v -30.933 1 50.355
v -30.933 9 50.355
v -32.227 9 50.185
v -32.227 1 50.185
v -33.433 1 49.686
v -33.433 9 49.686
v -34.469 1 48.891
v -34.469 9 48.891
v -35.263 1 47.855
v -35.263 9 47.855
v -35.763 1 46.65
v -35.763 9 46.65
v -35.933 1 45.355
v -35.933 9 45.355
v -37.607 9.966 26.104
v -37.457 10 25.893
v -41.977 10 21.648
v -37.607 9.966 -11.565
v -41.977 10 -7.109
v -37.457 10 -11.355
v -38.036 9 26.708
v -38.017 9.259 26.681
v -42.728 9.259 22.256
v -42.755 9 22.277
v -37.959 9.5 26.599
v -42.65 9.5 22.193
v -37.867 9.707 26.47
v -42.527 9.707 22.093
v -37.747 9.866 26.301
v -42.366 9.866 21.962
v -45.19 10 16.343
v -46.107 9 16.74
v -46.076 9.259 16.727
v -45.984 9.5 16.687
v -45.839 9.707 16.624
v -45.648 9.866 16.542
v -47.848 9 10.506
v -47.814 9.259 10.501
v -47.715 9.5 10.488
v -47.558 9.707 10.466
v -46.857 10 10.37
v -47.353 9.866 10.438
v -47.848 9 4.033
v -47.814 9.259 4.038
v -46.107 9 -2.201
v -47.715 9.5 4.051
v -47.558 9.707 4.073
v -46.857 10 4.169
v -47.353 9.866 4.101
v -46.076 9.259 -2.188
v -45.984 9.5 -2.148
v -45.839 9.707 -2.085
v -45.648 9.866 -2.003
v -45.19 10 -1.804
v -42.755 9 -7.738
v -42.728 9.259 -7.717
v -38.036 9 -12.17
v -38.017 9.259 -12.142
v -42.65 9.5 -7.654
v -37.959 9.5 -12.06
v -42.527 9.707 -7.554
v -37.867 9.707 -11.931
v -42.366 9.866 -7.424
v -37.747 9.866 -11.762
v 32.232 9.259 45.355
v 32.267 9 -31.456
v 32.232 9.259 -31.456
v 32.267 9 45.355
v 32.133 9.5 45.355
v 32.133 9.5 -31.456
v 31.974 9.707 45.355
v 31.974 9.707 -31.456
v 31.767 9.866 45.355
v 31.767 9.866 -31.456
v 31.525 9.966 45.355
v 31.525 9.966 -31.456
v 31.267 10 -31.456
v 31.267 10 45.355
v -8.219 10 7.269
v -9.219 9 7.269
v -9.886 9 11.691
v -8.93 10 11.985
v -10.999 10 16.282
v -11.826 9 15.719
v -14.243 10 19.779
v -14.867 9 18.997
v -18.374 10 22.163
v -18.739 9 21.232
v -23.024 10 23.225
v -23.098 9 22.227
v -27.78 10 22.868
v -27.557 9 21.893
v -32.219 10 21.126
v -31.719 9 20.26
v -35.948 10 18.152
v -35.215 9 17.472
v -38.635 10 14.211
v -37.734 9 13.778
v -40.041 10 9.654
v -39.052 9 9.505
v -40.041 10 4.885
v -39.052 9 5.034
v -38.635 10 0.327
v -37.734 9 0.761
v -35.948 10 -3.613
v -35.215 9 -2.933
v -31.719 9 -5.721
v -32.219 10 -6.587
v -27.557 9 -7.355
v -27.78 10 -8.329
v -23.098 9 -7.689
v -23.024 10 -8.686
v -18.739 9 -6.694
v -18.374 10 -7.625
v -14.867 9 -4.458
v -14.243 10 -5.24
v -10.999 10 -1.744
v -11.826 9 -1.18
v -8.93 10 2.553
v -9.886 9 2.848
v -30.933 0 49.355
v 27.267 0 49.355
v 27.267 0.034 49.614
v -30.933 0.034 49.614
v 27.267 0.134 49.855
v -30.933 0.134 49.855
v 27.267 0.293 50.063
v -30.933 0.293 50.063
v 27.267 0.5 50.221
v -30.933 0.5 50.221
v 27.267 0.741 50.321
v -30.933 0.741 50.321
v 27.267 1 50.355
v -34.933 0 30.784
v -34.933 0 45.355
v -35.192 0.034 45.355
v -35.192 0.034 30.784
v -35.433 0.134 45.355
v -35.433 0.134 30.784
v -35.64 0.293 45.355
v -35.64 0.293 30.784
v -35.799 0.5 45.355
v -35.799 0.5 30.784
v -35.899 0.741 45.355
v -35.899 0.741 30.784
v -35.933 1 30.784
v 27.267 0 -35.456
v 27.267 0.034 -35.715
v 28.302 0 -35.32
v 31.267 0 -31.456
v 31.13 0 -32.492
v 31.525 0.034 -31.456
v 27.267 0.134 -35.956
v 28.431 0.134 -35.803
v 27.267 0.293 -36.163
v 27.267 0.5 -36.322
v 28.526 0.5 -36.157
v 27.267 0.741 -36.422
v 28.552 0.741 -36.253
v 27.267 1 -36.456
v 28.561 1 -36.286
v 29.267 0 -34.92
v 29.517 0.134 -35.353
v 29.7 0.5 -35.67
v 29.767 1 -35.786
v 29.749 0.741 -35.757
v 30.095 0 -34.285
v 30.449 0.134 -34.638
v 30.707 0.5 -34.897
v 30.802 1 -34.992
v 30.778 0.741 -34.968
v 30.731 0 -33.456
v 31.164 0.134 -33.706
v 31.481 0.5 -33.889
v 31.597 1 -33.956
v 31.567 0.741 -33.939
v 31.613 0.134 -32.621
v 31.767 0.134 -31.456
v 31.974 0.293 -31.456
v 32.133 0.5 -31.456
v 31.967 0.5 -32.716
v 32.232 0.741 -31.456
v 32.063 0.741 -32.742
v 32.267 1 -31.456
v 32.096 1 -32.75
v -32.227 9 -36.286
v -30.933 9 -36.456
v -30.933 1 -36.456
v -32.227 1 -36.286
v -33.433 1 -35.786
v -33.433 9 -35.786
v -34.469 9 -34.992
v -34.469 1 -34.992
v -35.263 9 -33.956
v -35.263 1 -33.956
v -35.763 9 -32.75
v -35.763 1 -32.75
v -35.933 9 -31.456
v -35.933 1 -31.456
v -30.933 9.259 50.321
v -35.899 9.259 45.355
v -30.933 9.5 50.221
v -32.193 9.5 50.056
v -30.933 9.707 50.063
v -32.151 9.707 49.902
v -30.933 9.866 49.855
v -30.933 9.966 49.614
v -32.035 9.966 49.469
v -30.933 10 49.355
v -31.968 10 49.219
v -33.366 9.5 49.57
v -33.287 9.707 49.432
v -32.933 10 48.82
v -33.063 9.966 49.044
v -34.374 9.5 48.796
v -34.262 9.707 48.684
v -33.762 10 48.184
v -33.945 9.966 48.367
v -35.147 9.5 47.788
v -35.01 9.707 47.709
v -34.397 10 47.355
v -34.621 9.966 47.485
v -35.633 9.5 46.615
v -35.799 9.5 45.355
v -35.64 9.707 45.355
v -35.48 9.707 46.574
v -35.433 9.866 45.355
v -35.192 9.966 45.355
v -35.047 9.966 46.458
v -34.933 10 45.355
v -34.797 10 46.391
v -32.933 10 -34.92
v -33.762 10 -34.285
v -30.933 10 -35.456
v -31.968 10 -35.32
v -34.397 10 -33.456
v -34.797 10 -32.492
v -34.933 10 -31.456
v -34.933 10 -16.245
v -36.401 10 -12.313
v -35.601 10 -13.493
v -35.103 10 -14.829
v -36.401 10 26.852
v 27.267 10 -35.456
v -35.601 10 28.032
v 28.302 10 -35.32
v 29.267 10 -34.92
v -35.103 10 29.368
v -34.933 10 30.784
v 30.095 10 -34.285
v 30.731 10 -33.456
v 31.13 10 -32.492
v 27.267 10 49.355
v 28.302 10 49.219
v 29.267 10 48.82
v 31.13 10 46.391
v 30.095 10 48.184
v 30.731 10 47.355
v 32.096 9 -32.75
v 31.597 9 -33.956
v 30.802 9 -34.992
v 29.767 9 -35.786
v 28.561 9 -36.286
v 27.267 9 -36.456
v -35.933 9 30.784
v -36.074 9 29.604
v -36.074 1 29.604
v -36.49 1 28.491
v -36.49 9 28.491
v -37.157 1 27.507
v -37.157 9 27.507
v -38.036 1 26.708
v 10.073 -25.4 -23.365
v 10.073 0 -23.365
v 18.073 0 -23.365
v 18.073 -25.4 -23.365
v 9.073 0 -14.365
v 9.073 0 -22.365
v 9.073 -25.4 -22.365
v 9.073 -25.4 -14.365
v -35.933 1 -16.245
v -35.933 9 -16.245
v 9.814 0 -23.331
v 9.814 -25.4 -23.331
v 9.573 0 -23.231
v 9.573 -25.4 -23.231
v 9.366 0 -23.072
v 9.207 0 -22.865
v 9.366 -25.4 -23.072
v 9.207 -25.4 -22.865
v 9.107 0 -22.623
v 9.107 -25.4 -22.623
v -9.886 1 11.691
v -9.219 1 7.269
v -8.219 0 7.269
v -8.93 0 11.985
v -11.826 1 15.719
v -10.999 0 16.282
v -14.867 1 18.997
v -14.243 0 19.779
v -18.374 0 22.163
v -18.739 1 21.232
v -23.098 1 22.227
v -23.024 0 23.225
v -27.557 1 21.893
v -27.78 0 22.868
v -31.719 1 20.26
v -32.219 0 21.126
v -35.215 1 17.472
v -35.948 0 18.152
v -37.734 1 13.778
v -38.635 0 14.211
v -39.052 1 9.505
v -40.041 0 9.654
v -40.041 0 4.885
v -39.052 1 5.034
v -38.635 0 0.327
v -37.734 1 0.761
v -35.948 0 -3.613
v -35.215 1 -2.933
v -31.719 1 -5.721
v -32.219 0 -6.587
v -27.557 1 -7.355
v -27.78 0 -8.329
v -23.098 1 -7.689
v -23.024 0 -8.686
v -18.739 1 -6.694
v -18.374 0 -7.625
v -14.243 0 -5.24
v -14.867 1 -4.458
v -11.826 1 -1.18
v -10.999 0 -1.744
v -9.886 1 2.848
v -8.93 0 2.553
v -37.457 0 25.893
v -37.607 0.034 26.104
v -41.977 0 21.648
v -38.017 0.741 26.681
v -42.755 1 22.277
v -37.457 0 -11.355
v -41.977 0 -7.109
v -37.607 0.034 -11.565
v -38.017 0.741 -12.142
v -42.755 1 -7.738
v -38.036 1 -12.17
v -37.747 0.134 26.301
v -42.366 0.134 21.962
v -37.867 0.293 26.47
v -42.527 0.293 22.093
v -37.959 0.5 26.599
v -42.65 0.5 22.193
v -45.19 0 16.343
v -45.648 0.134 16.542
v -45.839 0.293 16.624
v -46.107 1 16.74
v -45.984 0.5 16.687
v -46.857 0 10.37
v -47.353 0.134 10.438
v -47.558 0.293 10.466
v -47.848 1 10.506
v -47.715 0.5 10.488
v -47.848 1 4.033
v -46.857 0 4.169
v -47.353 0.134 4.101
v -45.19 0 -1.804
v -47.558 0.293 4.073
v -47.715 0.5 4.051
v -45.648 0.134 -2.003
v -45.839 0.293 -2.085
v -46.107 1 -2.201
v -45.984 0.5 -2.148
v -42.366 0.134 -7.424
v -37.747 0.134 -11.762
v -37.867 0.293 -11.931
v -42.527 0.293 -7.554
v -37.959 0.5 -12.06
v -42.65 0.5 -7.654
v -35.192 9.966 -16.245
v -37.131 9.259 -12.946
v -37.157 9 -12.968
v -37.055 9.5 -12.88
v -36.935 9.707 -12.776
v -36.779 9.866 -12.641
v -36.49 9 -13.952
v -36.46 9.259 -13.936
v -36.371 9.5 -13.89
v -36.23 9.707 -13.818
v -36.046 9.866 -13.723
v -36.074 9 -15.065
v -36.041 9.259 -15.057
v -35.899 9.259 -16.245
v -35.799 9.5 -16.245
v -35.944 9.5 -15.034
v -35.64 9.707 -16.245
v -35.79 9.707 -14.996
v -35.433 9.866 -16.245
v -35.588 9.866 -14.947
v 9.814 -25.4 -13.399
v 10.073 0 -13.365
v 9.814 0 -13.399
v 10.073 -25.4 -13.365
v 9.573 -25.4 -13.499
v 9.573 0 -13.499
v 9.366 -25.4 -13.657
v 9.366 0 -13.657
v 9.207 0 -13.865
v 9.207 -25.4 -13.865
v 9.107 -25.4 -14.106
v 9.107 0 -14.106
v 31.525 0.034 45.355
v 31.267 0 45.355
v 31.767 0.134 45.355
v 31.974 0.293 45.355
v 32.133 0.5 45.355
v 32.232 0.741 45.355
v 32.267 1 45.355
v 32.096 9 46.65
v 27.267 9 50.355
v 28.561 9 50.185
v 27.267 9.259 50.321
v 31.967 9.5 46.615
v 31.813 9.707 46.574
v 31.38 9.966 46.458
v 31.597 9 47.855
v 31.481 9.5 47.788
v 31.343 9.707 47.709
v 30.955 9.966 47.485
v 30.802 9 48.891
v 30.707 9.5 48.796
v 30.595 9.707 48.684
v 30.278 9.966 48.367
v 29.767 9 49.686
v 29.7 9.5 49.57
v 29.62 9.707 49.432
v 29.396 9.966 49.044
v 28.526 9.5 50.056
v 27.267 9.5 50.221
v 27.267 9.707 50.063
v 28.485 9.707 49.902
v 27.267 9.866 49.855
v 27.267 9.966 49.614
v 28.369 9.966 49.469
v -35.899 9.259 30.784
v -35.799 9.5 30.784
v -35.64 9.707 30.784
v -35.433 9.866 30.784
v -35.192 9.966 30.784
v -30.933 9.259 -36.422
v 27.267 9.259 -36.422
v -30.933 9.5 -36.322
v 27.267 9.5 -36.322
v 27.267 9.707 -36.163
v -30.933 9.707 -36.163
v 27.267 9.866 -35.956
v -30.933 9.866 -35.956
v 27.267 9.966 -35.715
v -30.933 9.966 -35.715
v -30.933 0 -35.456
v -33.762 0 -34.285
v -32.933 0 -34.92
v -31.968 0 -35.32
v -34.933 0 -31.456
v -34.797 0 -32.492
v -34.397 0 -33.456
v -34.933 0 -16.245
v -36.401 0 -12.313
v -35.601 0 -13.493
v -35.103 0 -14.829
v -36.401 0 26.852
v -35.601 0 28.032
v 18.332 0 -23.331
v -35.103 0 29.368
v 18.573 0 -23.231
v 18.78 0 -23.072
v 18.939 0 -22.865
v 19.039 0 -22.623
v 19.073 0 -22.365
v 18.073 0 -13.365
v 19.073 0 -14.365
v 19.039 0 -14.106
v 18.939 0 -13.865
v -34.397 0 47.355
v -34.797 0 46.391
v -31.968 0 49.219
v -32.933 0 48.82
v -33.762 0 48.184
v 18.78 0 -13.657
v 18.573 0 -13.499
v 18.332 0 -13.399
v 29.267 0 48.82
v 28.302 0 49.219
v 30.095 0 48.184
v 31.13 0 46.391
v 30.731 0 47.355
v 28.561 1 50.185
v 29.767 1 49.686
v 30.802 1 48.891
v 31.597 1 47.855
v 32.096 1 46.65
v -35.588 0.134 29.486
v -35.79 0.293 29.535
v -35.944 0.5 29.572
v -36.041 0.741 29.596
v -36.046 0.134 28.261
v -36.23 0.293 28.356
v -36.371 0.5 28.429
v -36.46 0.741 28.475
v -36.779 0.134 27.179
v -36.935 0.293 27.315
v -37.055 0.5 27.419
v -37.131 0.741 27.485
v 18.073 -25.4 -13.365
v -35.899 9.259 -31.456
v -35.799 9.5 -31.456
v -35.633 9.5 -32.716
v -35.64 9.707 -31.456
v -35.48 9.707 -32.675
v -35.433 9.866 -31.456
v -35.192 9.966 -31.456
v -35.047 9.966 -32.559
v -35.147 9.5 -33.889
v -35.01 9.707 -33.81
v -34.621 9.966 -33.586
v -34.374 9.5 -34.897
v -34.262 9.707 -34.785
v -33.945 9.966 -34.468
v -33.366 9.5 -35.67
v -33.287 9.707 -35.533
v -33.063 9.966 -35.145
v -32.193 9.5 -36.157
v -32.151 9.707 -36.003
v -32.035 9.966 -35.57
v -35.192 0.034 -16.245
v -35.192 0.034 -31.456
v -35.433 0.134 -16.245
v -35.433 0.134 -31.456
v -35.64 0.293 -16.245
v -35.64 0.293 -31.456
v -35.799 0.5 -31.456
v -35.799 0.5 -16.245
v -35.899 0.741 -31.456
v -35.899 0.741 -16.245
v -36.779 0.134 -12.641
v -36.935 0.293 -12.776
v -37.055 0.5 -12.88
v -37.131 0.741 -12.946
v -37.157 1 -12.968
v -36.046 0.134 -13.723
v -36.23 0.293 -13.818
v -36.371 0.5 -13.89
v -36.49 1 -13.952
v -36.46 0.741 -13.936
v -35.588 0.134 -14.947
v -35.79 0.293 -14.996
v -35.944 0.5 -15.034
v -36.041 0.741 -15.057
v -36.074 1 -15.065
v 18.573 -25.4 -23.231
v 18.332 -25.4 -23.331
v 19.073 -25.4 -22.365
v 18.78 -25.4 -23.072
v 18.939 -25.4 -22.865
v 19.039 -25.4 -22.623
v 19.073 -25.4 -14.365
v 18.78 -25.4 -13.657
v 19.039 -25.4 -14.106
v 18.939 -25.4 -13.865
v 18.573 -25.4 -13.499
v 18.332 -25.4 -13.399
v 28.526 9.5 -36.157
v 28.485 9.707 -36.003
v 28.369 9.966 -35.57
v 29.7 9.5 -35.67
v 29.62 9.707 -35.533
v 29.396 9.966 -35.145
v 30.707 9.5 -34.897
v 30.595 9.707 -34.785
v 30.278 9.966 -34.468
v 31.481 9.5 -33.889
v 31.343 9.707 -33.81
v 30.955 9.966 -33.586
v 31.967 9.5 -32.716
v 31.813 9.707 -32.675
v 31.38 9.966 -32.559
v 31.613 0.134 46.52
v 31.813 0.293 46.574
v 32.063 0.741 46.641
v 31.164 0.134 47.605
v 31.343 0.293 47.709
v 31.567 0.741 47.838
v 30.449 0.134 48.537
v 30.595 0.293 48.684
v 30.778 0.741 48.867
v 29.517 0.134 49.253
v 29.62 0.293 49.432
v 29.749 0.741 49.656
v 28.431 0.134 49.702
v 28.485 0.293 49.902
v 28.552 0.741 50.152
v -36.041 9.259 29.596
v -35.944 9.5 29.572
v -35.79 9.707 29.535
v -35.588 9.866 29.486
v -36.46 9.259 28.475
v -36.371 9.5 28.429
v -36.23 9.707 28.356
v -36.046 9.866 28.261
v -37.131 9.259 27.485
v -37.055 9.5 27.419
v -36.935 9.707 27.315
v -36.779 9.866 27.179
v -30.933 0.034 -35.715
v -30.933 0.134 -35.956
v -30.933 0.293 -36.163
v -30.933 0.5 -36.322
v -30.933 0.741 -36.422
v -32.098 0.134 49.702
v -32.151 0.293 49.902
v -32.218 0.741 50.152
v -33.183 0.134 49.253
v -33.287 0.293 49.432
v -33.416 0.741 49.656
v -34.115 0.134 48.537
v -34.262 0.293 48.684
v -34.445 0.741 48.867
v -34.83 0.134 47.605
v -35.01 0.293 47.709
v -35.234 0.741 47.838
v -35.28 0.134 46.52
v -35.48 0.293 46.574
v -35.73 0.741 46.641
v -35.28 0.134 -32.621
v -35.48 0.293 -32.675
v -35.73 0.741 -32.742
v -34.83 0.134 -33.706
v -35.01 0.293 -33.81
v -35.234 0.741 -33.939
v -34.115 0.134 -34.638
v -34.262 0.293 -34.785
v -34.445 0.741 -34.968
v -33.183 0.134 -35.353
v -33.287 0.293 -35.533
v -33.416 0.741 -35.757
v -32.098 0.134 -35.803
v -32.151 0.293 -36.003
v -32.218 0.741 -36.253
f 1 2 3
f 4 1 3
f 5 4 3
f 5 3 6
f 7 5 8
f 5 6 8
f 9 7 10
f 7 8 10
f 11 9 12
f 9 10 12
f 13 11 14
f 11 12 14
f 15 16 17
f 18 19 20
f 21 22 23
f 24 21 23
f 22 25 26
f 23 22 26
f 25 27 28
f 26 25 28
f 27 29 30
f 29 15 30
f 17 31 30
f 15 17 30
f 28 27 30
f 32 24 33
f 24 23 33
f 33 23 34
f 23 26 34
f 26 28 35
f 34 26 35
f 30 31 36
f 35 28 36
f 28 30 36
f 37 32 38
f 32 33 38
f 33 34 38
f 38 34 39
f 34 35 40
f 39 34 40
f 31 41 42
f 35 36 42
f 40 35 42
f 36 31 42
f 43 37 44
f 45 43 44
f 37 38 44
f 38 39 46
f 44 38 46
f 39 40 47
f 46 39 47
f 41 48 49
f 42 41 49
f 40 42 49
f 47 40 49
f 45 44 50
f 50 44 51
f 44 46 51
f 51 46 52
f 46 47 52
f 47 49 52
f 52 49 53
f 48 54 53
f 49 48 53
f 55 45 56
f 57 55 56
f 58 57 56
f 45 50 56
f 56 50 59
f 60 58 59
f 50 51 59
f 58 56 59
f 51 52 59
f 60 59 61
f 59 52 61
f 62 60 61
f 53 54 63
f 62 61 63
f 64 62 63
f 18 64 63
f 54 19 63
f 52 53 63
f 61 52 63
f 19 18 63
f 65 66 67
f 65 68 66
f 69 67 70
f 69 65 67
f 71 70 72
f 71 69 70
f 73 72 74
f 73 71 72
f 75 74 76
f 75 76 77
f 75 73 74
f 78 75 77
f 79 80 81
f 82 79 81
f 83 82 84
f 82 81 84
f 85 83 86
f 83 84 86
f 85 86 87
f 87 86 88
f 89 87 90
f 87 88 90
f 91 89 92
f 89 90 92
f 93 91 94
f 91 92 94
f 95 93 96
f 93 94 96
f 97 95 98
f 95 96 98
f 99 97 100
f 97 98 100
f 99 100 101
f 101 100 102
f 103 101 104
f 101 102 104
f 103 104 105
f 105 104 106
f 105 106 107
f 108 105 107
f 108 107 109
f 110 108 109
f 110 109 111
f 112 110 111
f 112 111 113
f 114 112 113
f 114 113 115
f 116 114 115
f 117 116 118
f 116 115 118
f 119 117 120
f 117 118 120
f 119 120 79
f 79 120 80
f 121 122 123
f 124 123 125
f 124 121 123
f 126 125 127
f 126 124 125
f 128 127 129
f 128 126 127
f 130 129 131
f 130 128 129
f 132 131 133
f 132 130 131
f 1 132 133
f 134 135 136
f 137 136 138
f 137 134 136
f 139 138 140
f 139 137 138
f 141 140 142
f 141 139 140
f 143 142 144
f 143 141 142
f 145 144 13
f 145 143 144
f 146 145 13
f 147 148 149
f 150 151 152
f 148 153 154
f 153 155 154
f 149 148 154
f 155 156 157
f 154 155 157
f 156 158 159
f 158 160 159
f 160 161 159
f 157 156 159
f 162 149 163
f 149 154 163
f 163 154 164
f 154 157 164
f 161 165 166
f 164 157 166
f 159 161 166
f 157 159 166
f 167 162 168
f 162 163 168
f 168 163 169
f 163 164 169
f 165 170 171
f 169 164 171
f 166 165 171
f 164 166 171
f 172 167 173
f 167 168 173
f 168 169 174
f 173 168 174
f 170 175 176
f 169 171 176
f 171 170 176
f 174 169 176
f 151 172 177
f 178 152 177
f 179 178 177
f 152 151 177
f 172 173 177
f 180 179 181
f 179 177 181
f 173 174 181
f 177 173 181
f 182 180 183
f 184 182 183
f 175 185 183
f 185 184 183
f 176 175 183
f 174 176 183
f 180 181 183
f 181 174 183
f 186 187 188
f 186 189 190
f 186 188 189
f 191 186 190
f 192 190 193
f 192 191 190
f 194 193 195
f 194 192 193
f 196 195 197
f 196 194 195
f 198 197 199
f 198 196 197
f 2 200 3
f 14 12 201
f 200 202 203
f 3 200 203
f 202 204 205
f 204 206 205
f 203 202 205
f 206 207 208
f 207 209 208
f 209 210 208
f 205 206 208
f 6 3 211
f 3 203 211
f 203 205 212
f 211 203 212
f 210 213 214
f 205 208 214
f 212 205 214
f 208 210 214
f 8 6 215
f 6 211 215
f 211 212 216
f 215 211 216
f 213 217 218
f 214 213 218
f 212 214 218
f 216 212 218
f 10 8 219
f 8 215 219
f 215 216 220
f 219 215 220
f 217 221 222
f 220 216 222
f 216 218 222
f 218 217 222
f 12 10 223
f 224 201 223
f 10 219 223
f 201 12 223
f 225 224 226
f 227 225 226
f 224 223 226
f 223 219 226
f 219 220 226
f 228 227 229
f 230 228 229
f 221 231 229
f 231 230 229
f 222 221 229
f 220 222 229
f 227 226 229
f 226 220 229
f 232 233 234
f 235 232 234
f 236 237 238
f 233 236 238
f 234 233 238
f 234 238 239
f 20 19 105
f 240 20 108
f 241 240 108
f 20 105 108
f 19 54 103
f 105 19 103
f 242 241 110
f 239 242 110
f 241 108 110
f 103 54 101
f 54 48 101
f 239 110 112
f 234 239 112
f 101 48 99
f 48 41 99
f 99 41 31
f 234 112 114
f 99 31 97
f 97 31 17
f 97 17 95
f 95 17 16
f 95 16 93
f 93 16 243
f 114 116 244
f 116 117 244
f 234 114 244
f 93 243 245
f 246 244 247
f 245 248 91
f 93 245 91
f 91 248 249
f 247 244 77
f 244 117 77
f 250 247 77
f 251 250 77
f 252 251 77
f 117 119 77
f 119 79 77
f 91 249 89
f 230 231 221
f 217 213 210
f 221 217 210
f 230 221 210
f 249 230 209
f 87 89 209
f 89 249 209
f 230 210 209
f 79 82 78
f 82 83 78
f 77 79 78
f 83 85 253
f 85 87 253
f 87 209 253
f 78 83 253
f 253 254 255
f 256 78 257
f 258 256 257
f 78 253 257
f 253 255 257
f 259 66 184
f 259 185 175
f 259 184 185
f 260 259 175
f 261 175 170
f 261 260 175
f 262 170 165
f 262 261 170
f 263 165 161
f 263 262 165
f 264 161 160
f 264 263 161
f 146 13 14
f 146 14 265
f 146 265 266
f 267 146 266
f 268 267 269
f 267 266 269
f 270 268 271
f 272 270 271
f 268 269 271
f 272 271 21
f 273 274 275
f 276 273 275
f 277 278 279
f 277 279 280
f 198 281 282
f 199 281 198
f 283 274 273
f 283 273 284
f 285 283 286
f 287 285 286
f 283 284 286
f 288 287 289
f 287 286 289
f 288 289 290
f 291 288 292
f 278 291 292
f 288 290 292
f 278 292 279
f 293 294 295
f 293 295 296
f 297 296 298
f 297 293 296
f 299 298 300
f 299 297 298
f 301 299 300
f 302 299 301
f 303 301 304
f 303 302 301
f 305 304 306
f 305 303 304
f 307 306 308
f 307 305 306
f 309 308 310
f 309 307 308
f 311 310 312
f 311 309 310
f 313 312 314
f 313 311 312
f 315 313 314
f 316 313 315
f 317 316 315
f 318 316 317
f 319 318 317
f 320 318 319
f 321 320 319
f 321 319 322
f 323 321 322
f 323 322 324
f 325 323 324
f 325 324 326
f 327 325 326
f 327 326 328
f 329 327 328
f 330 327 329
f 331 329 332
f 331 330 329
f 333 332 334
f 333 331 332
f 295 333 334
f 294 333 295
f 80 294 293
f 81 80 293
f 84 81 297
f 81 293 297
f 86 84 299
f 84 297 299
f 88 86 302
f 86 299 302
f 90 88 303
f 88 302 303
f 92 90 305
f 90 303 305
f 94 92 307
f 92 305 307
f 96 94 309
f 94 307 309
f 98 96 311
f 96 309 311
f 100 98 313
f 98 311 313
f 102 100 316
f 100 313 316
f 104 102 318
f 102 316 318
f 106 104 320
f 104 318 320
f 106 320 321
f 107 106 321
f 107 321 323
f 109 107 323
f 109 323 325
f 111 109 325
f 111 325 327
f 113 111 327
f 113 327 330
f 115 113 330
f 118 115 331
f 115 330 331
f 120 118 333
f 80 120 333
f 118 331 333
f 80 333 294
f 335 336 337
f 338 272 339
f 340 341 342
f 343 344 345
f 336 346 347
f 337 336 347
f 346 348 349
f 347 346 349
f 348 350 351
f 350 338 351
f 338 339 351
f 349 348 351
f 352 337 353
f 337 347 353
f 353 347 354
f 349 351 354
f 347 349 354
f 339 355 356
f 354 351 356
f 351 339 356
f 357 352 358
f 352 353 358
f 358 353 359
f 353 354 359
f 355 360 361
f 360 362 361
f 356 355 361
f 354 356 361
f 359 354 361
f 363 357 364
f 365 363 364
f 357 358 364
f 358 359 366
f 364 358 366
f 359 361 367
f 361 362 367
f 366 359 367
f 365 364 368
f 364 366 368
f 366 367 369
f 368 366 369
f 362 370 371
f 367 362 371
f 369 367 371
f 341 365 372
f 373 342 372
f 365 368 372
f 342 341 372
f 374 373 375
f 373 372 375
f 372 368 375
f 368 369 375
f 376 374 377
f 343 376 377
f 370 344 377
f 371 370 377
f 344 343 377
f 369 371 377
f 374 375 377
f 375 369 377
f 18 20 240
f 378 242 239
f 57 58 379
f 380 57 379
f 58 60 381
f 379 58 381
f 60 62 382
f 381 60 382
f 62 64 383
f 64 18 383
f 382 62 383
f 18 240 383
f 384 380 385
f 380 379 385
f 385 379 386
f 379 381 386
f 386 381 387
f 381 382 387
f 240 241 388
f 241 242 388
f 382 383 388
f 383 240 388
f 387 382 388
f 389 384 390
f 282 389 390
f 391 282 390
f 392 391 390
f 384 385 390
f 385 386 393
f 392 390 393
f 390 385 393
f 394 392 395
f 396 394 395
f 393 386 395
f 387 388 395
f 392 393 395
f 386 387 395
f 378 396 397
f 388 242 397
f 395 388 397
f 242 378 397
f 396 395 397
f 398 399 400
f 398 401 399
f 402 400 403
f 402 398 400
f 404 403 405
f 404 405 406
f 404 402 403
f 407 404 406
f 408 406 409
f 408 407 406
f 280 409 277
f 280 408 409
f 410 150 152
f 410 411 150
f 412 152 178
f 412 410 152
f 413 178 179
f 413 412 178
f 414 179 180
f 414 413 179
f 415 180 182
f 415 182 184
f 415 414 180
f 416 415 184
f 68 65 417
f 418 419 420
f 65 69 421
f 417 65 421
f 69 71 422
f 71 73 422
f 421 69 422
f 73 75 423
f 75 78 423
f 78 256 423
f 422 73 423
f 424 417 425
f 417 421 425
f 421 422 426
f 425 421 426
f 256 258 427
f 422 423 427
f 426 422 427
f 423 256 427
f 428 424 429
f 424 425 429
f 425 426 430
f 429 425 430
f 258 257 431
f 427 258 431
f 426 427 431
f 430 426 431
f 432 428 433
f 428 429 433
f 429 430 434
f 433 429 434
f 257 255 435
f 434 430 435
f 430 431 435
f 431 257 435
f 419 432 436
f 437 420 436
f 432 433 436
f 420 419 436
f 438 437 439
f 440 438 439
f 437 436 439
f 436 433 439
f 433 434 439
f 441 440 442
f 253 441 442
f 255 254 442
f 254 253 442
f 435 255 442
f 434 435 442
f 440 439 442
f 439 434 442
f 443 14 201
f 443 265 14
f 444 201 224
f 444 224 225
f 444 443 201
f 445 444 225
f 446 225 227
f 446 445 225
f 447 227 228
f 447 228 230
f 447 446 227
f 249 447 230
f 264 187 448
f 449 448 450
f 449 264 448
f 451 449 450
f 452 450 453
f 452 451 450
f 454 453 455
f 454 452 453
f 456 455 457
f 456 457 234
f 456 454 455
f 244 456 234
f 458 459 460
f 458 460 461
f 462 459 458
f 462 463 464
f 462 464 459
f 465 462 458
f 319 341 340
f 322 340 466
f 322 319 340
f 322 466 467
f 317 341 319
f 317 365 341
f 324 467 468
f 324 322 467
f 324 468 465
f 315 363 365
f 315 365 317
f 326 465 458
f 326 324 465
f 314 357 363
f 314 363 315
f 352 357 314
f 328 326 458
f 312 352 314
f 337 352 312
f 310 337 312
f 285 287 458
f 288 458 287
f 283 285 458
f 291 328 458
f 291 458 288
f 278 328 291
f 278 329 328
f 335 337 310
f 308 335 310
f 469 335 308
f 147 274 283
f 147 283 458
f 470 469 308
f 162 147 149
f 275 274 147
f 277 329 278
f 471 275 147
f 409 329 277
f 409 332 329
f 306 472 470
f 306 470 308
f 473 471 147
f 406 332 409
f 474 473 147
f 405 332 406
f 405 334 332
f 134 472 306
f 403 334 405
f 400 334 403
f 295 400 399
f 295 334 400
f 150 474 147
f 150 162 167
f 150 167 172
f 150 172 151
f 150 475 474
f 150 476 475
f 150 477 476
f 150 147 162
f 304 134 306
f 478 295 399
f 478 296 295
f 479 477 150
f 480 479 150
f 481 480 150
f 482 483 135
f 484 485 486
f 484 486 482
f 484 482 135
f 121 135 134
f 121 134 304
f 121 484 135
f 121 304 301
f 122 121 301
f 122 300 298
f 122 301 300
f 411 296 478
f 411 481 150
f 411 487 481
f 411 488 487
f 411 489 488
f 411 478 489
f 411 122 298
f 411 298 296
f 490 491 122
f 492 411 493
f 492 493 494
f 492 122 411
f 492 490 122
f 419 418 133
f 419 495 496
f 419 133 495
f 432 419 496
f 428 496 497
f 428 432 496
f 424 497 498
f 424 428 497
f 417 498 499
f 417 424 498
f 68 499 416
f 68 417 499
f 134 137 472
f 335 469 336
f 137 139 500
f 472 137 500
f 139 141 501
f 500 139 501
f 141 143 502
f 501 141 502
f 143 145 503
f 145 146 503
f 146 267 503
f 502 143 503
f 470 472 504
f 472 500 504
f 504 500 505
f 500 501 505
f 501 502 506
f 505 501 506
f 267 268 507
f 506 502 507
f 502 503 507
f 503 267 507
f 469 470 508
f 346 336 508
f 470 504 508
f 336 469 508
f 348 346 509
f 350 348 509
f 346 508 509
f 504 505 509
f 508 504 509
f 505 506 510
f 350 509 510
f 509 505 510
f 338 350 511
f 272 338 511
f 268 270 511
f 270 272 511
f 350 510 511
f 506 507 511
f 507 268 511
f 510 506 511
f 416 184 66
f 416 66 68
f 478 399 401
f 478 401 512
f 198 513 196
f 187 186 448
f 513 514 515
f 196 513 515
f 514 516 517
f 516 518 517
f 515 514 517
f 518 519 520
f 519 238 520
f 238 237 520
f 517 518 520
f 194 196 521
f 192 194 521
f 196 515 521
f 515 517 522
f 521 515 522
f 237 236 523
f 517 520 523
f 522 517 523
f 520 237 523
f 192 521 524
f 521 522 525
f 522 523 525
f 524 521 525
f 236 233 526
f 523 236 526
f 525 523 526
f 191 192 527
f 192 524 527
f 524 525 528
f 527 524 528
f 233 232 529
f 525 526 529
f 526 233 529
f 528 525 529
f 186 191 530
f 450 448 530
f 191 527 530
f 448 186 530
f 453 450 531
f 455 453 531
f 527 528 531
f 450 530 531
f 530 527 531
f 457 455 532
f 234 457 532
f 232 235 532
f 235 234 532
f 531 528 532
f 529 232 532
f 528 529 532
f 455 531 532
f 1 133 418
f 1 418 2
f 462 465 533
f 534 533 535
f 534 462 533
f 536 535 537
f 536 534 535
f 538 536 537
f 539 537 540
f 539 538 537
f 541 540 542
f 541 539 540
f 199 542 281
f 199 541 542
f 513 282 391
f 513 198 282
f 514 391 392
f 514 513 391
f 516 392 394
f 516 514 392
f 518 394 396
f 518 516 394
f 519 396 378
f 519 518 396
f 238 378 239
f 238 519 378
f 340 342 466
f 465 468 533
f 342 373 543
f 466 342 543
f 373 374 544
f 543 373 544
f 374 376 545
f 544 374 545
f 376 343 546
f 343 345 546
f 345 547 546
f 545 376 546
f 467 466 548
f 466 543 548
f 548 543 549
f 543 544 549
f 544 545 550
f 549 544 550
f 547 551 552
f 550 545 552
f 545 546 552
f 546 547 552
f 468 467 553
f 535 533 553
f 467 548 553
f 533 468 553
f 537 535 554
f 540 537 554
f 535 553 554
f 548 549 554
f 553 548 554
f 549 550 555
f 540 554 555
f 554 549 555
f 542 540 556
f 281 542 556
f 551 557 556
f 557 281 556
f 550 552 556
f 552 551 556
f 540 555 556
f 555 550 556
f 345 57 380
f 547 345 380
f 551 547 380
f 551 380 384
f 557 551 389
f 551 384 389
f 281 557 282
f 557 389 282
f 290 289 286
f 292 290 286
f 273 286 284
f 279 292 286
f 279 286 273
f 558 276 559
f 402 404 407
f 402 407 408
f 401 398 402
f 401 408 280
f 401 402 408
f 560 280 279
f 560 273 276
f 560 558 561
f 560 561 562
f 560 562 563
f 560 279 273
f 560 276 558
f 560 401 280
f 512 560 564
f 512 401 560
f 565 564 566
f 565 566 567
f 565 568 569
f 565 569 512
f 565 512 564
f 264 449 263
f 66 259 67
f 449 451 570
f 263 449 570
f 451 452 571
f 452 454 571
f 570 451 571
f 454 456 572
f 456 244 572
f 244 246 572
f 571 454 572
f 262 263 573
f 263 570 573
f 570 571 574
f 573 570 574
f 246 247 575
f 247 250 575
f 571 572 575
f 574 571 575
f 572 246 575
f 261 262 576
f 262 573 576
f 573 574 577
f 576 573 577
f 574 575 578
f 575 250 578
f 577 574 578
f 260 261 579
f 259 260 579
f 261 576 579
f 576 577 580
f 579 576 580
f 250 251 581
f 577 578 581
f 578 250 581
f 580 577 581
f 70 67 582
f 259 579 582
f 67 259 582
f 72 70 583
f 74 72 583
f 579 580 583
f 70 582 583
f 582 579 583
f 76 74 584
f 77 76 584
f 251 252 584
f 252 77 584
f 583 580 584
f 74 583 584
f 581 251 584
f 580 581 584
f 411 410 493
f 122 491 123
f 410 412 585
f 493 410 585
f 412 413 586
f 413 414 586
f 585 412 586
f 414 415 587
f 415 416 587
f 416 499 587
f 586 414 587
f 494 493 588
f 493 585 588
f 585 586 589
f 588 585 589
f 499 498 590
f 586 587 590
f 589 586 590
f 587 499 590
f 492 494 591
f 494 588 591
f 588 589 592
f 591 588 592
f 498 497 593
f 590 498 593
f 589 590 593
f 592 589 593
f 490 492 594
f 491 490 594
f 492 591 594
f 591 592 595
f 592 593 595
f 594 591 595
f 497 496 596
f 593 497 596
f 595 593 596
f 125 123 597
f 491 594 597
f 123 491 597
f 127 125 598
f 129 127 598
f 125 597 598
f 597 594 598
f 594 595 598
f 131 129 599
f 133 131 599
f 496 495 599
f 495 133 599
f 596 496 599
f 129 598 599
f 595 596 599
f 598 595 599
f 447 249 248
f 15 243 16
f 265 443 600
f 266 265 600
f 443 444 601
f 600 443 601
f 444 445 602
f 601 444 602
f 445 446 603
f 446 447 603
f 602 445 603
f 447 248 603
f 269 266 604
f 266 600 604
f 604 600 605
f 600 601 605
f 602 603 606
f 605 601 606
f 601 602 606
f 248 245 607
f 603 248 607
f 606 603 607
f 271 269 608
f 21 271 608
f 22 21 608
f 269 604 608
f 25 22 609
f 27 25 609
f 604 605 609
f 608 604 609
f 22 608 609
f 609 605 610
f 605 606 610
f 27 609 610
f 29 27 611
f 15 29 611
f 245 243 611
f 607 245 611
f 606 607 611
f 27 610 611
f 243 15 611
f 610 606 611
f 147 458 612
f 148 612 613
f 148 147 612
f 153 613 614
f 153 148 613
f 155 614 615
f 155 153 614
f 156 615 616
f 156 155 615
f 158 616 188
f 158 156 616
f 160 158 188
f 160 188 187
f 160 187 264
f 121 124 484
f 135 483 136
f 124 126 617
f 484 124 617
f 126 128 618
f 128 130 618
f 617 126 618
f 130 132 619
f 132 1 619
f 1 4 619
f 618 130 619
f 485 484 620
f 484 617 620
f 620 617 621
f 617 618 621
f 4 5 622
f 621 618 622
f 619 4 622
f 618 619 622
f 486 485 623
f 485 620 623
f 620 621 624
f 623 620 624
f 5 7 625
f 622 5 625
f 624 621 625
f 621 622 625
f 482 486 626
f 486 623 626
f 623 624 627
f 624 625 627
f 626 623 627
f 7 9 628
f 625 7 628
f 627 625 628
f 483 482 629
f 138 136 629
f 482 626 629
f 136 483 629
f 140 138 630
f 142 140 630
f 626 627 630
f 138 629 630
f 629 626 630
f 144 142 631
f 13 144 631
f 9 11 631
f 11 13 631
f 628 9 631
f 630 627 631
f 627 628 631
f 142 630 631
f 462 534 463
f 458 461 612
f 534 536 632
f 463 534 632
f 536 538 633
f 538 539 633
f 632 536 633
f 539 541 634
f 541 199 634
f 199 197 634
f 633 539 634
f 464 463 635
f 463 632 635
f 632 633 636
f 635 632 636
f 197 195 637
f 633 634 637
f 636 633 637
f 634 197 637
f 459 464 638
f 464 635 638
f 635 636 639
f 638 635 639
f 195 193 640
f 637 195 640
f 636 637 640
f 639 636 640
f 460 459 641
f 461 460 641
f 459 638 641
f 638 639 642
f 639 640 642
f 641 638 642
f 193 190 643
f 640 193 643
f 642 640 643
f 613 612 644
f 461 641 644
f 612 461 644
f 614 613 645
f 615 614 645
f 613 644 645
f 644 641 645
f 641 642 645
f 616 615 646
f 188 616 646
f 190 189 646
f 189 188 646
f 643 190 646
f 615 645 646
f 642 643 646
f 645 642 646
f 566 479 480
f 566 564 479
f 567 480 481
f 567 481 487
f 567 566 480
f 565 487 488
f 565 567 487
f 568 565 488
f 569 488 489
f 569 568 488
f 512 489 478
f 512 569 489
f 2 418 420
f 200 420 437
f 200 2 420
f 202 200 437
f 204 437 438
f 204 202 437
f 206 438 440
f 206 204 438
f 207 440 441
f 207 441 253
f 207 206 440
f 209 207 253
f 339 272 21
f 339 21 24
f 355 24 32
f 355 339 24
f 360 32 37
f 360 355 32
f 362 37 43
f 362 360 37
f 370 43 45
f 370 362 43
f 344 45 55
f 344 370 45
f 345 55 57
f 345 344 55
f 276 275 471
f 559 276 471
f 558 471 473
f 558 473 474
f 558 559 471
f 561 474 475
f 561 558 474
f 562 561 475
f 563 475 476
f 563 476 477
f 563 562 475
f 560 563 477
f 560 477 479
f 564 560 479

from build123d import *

# Parameters (mm, degrees)
F0_R     = 15
F1_DEPTH = 10
F2_R     = 5
F3_SIZE  = 1
F4_R     = 1
F5_W     = 10
F5_H     = 10
F6_DEPTH = 25.4
F7_R     = 1


with BuildPart() as f1:
    # F0 (on Front) → F1 (new body)
    with BuildSketch(Plane.XZ):
        with BuildLine():
            Line((32.266531, 50.35542), (-35.933132, 50.35542))
            Line((-35.933132, 50.35542), (-35.933132, 28.043626))
            ThreePointArc((-35.933132, 28.043626), (-48.068501, 7.269355), (-35.933132, -13.504916))
            Line((-35.933132, -13.504916), (-35.933132, -36.456365))
            Line((-35.933132, -36.456365), (32.266531, -36.456365))
            Line((32.266531, -36.456365), (32.266531, 50.35542))
        make_face()
        with Locations((-24.219309, 7.269355)):
            Circle(F0_R, mode=Mode.SUBTRACT)
    extrude(amount=-F1_DEPTH)

    # F2
    f2_edges = [f1.edges().sort_by_distance(p)[0] for p in [
        (-35.933132, 5, 28.043626),
        (-35.933132, 5, -13.504916),
        (-35.933132, 5, 50.35542),
        (-35.933132, 5, -36.456365),
        (32.266531, 5, 50.35542),
        (32.266531, 5, -36.456365),
    ]]
    fillet(f2_edges, radius=F2_R)

    # F3
    f3_edges = [f1.edges().sort_by_distance(p)[0] for p in [
        (-39.219309, 10, 7.269355),
        (-39.219309, 0, 7.269355),
    ]]
    chamfer(f3_edges, length=F3_SIZE)

    # F4
    f4_edges = [f1.edges().sort_by_distance(p)[0] for p in [
        (-1.8333, 10, 50.35542),
        (32.266531, 0, 6.949527),
    ]]
    fillet(f4_edges, radius=F4_R)

    # F5 (on Front) → F6 (join)
    with BuildSketch(Plane.XZ):
        with Locations((14.072881, -18.364601)):
            Rectangle(F5_W, F5_H)
    extrude(amount=F6_DEPTH)

    # F7
    f7_edges = [f1.edges().sort_by_distance(p)[0] for p in [
        (19.072881, -12.7, -23.364601),
        (9.072881, -12.7, -23.364601),
        (9.072881, -12.7, -13.364601),
        (19.072881, -12.7, -13.364601),
    ]]
    fillet(f7_edges, radius=F7_R)


solid = f1.part
